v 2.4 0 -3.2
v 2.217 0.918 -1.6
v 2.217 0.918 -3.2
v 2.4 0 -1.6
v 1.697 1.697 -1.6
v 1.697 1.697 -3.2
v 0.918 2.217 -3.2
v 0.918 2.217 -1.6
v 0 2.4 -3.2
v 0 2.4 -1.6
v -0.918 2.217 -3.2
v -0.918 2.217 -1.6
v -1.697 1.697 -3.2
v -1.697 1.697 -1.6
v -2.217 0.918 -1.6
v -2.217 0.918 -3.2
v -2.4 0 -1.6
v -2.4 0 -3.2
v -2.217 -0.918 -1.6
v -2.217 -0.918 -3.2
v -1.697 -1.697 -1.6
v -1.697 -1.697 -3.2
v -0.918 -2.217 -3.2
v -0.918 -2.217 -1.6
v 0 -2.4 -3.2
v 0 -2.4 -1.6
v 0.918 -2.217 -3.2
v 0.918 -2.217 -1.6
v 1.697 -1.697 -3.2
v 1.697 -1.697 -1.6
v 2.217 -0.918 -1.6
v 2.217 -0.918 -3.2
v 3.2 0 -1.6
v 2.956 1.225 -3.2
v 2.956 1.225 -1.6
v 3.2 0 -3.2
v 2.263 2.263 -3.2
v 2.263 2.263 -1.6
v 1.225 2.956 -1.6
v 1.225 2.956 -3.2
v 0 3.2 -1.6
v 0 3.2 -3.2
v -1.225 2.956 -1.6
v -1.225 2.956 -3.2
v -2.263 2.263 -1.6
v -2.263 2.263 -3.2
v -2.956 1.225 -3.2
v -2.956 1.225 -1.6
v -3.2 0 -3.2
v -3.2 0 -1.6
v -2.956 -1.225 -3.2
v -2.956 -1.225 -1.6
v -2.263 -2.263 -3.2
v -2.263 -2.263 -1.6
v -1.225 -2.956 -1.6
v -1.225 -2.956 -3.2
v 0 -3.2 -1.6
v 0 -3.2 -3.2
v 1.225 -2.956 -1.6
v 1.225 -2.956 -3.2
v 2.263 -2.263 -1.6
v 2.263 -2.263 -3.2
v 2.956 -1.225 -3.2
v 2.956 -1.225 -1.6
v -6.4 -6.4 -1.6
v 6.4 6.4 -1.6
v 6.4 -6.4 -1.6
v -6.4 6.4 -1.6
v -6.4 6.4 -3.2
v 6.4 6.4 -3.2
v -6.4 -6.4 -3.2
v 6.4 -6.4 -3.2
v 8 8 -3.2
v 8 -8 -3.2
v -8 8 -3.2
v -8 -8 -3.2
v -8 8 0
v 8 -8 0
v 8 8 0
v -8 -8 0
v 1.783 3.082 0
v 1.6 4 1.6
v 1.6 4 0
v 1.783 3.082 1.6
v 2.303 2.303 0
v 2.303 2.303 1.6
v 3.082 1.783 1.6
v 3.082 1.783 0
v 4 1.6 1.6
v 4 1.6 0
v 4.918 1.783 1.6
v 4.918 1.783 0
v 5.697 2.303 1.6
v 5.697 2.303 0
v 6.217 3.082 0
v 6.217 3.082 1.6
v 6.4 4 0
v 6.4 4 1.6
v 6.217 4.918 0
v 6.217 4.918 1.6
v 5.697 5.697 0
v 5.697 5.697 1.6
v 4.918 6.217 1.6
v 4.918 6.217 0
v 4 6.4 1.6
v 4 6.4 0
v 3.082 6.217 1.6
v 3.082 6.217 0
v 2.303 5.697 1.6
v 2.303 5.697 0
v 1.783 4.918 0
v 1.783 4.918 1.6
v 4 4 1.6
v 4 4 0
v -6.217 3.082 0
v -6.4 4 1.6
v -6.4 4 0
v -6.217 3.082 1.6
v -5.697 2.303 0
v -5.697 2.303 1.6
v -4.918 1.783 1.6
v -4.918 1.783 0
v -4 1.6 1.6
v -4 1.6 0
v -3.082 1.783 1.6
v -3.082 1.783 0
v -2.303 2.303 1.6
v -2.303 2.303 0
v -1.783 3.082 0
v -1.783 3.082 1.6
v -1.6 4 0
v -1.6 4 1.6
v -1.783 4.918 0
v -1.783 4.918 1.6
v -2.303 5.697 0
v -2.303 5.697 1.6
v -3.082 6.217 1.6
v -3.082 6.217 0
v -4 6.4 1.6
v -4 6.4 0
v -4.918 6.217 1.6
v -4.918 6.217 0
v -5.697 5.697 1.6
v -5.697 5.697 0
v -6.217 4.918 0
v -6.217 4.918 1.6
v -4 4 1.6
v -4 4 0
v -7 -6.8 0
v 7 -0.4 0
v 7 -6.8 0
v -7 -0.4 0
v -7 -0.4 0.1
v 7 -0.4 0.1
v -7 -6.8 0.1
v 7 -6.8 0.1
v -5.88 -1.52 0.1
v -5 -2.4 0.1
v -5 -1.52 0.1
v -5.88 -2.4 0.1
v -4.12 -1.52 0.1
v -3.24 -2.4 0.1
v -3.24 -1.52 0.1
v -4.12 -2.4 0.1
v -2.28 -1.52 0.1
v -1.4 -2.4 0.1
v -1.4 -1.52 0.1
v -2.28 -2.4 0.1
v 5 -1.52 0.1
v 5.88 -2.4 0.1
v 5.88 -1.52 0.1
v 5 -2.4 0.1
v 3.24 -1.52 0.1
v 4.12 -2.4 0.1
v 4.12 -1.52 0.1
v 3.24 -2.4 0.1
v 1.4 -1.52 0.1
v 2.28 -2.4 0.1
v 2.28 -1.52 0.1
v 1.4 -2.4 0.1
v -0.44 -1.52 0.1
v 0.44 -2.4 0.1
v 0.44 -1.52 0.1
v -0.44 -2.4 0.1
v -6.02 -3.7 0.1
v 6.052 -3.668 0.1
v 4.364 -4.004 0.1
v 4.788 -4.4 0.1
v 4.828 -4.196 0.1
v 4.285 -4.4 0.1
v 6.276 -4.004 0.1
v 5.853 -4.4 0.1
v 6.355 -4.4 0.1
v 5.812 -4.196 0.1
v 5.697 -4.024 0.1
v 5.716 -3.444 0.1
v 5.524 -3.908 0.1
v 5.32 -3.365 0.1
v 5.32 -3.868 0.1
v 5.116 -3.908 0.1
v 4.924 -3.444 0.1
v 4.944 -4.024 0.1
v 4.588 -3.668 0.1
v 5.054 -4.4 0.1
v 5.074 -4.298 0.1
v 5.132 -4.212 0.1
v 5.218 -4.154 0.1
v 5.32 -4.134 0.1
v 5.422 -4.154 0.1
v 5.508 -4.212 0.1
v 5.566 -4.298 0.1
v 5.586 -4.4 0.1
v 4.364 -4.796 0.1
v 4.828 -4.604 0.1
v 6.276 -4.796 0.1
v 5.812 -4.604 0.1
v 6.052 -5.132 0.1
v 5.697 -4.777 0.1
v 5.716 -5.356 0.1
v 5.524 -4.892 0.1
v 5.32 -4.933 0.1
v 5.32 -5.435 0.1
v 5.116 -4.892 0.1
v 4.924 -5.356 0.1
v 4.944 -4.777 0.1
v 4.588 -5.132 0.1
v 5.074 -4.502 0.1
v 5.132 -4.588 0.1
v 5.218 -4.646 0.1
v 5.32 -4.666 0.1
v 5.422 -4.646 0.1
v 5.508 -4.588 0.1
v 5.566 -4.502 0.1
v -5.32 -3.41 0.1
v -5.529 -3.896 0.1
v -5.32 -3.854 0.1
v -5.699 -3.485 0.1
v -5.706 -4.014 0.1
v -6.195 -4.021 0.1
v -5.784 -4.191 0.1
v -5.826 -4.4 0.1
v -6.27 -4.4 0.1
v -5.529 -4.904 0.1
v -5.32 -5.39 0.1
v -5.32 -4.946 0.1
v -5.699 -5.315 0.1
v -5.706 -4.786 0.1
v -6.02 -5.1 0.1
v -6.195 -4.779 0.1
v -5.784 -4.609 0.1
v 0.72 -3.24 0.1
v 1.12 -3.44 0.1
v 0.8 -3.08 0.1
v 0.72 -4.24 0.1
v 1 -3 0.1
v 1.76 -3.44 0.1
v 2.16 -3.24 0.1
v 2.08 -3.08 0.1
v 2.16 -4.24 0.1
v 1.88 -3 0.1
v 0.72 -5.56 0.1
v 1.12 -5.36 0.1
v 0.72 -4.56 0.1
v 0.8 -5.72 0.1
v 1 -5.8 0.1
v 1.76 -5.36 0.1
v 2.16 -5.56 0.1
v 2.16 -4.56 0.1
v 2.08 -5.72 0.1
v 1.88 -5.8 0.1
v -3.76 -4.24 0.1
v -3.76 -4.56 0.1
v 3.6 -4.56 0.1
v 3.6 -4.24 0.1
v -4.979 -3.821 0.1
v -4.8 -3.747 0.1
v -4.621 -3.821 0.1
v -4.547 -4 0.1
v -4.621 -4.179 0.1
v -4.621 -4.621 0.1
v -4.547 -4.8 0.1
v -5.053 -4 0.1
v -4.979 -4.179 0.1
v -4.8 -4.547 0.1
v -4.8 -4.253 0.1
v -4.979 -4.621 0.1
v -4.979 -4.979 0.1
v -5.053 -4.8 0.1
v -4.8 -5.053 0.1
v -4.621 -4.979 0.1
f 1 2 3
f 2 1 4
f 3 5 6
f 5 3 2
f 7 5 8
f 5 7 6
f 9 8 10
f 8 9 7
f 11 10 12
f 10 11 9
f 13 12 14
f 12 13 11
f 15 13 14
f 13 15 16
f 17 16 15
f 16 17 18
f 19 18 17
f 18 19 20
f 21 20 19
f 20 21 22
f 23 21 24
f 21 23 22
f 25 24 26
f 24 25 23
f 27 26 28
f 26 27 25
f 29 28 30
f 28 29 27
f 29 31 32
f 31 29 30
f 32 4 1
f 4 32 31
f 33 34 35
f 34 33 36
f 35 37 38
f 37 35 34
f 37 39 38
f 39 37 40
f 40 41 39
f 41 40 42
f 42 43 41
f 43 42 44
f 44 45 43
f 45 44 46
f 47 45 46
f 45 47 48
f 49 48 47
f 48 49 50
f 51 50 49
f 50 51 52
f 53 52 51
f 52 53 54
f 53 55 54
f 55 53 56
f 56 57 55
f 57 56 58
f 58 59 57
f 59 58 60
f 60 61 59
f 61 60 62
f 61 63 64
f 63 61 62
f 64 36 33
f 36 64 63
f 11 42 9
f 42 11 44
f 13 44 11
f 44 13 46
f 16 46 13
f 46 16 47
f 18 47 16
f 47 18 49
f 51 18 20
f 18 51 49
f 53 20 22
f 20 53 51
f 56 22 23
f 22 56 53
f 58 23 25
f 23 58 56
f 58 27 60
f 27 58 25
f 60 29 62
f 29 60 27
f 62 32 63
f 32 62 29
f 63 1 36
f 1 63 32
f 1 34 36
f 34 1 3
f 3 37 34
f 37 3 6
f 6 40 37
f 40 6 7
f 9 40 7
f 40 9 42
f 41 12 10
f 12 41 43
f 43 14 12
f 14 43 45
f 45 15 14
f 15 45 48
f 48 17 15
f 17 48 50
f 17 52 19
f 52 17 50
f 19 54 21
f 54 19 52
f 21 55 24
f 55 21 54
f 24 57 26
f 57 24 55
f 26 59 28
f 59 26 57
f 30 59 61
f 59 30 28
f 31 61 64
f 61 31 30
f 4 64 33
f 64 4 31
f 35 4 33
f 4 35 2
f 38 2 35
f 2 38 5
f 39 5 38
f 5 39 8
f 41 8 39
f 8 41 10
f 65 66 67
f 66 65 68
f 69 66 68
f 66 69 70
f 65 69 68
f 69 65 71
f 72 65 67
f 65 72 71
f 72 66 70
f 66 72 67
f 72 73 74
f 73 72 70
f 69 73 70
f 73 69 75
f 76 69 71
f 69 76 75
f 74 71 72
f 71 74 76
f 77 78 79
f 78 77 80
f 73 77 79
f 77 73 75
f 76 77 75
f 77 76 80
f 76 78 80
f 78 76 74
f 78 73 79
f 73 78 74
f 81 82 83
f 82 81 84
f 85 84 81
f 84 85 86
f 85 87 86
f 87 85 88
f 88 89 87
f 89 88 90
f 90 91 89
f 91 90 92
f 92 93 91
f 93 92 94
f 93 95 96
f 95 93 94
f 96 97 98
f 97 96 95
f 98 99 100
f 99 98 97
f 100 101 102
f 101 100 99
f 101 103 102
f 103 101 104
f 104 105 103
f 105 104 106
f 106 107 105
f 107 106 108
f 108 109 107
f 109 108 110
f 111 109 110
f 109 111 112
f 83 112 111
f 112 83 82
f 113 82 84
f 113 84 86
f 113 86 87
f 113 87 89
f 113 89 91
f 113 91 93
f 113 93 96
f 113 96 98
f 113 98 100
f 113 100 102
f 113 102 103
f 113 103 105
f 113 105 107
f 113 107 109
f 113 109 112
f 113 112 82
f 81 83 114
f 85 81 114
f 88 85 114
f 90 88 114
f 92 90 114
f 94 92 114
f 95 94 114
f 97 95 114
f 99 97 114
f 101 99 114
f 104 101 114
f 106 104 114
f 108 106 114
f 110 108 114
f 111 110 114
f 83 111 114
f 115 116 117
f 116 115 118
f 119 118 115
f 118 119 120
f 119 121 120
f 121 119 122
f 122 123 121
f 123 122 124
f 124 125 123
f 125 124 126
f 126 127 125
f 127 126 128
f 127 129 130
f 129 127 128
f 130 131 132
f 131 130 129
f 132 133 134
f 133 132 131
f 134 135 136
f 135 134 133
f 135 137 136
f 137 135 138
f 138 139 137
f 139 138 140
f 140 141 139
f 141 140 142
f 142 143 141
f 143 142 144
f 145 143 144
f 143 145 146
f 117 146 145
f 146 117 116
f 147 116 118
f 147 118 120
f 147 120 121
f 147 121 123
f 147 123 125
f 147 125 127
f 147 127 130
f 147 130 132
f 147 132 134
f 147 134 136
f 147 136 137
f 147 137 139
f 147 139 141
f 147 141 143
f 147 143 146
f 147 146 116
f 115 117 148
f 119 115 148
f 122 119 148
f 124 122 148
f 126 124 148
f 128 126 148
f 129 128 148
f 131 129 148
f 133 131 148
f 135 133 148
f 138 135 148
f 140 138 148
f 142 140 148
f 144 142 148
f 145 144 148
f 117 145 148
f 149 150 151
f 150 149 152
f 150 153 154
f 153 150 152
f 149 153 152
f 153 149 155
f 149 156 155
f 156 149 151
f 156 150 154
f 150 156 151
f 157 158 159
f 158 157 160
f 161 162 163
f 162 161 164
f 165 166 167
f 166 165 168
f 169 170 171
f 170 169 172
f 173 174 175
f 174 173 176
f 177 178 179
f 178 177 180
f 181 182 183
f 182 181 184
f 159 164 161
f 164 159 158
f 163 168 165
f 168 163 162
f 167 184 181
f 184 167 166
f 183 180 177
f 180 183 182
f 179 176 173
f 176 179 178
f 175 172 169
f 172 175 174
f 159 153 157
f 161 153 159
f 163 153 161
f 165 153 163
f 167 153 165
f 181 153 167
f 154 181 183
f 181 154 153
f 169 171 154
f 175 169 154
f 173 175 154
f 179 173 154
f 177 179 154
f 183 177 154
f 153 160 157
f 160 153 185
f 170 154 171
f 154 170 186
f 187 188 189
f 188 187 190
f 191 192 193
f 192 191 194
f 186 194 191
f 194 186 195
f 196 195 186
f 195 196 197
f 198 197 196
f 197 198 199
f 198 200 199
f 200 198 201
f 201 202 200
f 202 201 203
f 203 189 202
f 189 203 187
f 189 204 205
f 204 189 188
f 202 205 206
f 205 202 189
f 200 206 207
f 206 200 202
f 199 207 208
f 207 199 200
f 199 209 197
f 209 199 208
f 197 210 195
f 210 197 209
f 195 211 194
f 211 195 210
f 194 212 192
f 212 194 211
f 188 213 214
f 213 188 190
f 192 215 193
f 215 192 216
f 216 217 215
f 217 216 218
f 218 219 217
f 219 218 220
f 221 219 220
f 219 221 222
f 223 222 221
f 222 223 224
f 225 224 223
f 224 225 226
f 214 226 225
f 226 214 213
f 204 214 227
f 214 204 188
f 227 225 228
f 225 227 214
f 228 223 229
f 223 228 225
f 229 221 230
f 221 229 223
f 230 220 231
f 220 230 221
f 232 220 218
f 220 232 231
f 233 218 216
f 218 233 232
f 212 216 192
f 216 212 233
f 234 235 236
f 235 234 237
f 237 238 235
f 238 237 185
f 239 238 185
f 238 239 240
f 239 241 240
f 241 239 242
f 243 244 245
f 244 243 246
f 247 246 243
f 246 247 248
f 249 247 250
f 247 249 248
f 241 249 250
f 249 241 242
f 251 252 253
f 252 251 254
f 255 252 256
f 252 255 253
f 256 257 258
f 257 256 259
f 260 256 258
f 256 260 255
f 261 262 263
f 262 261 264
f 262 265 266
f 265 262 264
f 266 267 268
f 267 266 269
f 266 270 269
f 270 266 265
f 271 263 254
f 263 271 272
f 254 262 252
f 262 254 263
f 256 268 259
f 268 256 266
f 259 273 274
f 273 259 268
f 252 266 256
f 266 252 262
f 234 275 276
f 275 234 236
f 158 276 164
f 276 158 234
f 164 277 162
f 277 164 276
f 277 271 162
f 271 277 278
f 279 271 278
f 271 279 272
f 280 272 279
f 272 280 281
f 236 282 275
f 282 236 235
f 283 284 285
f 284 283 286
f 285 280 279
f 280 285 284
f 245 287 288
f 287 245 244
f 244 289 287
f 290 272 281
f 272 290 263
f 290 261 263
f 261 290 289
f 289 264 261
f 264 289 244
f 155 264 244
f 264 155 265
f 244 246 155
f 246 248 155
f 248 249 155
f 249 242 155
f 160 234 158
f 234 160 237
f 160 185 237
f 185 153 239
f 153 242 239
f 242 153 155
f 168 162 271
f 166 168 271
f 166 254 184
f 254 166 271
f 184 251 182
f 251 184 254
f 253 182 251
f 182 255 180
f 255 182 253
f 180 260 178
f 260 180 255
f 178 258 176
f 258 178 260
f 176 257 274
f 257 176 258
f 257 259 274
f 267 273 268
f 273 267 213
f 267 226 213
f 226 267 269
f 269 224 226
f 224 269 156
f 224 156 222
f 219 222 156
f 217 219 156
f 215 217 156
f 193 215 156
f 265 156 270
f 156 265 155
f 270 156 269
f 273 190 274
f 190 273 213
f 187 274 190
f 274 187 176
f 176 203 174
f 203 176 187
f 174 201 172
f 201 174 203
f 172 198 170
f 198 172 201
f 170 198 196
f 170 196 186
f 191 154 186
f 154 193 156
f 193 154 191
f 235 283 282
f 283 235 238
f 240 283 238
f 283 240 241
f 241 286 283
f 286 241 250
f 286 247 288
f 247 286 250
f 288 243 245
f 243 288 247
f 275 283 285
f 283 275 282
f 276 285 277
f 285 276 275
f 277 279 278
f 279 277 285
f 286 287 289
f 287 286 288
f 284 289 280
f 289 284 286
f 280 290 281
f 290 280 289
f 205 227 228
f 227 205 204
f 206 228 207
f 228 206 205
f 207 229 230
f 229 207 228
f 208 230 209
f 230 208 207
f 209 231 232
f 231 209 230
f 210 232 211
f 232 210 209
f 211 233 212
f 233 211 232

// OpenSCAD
use <../lib.scad>
use <33909.scad>
use <6259759a.scad>
function ldraw_lib__33909d01() = [
// 0 Plate  2 x  2 with 2 Studs on One Edge with Dark Turquoise and Magenta Buttons and Slider Sticker
// 0 Name: 33909d01.dat
// 0 Author: Evert-Jan Boer [ejboer]
// 0 !LDRAW_ORG Shortcut UPDATE 2024-09
// 0 !LICENSE Licensed under CC BY 4.0 : see CAreadme.txt
// 
// 0 BFC CERTIFY CCW
  [0,"BFC","CERTIFY"],
  [0,"BFC","CCW"],
// 
// 0 !CATEGORY Sticker Shortcut
// 0 !KEYWORDS Bricklink 33909pb002, Set 70828
// 
// 0 !HISTORY 2024-10-27 [OrionP] Official Update 2024-09
// 
// 1 16 0 0 0 1 0 0 0 1 0 0 0 1 33909.dat
  [1,16,0,0,0,1,0,0,0,1,0,0,0,1, ldraw_lib__33909()],
// 1 16 0 0 -9 1 0 0 0 1 0 0 0 1 6259759a.dat
  [1,16,0,0,-9,1,0,0,0,1,0,0,0,1, ldraw_lib__6259759a()],
];
module ldraw_lib__33909d01(step=0, col=false, unit=2/5, alt=false, line=0.2, solid=!$preview)
    makepoly(ldraw_lib__33909d01(), step=step, col=col, unit=unit, alt=alt, line=line, solid=solid);
ldraw_lib__33909d01(line=0.2);
